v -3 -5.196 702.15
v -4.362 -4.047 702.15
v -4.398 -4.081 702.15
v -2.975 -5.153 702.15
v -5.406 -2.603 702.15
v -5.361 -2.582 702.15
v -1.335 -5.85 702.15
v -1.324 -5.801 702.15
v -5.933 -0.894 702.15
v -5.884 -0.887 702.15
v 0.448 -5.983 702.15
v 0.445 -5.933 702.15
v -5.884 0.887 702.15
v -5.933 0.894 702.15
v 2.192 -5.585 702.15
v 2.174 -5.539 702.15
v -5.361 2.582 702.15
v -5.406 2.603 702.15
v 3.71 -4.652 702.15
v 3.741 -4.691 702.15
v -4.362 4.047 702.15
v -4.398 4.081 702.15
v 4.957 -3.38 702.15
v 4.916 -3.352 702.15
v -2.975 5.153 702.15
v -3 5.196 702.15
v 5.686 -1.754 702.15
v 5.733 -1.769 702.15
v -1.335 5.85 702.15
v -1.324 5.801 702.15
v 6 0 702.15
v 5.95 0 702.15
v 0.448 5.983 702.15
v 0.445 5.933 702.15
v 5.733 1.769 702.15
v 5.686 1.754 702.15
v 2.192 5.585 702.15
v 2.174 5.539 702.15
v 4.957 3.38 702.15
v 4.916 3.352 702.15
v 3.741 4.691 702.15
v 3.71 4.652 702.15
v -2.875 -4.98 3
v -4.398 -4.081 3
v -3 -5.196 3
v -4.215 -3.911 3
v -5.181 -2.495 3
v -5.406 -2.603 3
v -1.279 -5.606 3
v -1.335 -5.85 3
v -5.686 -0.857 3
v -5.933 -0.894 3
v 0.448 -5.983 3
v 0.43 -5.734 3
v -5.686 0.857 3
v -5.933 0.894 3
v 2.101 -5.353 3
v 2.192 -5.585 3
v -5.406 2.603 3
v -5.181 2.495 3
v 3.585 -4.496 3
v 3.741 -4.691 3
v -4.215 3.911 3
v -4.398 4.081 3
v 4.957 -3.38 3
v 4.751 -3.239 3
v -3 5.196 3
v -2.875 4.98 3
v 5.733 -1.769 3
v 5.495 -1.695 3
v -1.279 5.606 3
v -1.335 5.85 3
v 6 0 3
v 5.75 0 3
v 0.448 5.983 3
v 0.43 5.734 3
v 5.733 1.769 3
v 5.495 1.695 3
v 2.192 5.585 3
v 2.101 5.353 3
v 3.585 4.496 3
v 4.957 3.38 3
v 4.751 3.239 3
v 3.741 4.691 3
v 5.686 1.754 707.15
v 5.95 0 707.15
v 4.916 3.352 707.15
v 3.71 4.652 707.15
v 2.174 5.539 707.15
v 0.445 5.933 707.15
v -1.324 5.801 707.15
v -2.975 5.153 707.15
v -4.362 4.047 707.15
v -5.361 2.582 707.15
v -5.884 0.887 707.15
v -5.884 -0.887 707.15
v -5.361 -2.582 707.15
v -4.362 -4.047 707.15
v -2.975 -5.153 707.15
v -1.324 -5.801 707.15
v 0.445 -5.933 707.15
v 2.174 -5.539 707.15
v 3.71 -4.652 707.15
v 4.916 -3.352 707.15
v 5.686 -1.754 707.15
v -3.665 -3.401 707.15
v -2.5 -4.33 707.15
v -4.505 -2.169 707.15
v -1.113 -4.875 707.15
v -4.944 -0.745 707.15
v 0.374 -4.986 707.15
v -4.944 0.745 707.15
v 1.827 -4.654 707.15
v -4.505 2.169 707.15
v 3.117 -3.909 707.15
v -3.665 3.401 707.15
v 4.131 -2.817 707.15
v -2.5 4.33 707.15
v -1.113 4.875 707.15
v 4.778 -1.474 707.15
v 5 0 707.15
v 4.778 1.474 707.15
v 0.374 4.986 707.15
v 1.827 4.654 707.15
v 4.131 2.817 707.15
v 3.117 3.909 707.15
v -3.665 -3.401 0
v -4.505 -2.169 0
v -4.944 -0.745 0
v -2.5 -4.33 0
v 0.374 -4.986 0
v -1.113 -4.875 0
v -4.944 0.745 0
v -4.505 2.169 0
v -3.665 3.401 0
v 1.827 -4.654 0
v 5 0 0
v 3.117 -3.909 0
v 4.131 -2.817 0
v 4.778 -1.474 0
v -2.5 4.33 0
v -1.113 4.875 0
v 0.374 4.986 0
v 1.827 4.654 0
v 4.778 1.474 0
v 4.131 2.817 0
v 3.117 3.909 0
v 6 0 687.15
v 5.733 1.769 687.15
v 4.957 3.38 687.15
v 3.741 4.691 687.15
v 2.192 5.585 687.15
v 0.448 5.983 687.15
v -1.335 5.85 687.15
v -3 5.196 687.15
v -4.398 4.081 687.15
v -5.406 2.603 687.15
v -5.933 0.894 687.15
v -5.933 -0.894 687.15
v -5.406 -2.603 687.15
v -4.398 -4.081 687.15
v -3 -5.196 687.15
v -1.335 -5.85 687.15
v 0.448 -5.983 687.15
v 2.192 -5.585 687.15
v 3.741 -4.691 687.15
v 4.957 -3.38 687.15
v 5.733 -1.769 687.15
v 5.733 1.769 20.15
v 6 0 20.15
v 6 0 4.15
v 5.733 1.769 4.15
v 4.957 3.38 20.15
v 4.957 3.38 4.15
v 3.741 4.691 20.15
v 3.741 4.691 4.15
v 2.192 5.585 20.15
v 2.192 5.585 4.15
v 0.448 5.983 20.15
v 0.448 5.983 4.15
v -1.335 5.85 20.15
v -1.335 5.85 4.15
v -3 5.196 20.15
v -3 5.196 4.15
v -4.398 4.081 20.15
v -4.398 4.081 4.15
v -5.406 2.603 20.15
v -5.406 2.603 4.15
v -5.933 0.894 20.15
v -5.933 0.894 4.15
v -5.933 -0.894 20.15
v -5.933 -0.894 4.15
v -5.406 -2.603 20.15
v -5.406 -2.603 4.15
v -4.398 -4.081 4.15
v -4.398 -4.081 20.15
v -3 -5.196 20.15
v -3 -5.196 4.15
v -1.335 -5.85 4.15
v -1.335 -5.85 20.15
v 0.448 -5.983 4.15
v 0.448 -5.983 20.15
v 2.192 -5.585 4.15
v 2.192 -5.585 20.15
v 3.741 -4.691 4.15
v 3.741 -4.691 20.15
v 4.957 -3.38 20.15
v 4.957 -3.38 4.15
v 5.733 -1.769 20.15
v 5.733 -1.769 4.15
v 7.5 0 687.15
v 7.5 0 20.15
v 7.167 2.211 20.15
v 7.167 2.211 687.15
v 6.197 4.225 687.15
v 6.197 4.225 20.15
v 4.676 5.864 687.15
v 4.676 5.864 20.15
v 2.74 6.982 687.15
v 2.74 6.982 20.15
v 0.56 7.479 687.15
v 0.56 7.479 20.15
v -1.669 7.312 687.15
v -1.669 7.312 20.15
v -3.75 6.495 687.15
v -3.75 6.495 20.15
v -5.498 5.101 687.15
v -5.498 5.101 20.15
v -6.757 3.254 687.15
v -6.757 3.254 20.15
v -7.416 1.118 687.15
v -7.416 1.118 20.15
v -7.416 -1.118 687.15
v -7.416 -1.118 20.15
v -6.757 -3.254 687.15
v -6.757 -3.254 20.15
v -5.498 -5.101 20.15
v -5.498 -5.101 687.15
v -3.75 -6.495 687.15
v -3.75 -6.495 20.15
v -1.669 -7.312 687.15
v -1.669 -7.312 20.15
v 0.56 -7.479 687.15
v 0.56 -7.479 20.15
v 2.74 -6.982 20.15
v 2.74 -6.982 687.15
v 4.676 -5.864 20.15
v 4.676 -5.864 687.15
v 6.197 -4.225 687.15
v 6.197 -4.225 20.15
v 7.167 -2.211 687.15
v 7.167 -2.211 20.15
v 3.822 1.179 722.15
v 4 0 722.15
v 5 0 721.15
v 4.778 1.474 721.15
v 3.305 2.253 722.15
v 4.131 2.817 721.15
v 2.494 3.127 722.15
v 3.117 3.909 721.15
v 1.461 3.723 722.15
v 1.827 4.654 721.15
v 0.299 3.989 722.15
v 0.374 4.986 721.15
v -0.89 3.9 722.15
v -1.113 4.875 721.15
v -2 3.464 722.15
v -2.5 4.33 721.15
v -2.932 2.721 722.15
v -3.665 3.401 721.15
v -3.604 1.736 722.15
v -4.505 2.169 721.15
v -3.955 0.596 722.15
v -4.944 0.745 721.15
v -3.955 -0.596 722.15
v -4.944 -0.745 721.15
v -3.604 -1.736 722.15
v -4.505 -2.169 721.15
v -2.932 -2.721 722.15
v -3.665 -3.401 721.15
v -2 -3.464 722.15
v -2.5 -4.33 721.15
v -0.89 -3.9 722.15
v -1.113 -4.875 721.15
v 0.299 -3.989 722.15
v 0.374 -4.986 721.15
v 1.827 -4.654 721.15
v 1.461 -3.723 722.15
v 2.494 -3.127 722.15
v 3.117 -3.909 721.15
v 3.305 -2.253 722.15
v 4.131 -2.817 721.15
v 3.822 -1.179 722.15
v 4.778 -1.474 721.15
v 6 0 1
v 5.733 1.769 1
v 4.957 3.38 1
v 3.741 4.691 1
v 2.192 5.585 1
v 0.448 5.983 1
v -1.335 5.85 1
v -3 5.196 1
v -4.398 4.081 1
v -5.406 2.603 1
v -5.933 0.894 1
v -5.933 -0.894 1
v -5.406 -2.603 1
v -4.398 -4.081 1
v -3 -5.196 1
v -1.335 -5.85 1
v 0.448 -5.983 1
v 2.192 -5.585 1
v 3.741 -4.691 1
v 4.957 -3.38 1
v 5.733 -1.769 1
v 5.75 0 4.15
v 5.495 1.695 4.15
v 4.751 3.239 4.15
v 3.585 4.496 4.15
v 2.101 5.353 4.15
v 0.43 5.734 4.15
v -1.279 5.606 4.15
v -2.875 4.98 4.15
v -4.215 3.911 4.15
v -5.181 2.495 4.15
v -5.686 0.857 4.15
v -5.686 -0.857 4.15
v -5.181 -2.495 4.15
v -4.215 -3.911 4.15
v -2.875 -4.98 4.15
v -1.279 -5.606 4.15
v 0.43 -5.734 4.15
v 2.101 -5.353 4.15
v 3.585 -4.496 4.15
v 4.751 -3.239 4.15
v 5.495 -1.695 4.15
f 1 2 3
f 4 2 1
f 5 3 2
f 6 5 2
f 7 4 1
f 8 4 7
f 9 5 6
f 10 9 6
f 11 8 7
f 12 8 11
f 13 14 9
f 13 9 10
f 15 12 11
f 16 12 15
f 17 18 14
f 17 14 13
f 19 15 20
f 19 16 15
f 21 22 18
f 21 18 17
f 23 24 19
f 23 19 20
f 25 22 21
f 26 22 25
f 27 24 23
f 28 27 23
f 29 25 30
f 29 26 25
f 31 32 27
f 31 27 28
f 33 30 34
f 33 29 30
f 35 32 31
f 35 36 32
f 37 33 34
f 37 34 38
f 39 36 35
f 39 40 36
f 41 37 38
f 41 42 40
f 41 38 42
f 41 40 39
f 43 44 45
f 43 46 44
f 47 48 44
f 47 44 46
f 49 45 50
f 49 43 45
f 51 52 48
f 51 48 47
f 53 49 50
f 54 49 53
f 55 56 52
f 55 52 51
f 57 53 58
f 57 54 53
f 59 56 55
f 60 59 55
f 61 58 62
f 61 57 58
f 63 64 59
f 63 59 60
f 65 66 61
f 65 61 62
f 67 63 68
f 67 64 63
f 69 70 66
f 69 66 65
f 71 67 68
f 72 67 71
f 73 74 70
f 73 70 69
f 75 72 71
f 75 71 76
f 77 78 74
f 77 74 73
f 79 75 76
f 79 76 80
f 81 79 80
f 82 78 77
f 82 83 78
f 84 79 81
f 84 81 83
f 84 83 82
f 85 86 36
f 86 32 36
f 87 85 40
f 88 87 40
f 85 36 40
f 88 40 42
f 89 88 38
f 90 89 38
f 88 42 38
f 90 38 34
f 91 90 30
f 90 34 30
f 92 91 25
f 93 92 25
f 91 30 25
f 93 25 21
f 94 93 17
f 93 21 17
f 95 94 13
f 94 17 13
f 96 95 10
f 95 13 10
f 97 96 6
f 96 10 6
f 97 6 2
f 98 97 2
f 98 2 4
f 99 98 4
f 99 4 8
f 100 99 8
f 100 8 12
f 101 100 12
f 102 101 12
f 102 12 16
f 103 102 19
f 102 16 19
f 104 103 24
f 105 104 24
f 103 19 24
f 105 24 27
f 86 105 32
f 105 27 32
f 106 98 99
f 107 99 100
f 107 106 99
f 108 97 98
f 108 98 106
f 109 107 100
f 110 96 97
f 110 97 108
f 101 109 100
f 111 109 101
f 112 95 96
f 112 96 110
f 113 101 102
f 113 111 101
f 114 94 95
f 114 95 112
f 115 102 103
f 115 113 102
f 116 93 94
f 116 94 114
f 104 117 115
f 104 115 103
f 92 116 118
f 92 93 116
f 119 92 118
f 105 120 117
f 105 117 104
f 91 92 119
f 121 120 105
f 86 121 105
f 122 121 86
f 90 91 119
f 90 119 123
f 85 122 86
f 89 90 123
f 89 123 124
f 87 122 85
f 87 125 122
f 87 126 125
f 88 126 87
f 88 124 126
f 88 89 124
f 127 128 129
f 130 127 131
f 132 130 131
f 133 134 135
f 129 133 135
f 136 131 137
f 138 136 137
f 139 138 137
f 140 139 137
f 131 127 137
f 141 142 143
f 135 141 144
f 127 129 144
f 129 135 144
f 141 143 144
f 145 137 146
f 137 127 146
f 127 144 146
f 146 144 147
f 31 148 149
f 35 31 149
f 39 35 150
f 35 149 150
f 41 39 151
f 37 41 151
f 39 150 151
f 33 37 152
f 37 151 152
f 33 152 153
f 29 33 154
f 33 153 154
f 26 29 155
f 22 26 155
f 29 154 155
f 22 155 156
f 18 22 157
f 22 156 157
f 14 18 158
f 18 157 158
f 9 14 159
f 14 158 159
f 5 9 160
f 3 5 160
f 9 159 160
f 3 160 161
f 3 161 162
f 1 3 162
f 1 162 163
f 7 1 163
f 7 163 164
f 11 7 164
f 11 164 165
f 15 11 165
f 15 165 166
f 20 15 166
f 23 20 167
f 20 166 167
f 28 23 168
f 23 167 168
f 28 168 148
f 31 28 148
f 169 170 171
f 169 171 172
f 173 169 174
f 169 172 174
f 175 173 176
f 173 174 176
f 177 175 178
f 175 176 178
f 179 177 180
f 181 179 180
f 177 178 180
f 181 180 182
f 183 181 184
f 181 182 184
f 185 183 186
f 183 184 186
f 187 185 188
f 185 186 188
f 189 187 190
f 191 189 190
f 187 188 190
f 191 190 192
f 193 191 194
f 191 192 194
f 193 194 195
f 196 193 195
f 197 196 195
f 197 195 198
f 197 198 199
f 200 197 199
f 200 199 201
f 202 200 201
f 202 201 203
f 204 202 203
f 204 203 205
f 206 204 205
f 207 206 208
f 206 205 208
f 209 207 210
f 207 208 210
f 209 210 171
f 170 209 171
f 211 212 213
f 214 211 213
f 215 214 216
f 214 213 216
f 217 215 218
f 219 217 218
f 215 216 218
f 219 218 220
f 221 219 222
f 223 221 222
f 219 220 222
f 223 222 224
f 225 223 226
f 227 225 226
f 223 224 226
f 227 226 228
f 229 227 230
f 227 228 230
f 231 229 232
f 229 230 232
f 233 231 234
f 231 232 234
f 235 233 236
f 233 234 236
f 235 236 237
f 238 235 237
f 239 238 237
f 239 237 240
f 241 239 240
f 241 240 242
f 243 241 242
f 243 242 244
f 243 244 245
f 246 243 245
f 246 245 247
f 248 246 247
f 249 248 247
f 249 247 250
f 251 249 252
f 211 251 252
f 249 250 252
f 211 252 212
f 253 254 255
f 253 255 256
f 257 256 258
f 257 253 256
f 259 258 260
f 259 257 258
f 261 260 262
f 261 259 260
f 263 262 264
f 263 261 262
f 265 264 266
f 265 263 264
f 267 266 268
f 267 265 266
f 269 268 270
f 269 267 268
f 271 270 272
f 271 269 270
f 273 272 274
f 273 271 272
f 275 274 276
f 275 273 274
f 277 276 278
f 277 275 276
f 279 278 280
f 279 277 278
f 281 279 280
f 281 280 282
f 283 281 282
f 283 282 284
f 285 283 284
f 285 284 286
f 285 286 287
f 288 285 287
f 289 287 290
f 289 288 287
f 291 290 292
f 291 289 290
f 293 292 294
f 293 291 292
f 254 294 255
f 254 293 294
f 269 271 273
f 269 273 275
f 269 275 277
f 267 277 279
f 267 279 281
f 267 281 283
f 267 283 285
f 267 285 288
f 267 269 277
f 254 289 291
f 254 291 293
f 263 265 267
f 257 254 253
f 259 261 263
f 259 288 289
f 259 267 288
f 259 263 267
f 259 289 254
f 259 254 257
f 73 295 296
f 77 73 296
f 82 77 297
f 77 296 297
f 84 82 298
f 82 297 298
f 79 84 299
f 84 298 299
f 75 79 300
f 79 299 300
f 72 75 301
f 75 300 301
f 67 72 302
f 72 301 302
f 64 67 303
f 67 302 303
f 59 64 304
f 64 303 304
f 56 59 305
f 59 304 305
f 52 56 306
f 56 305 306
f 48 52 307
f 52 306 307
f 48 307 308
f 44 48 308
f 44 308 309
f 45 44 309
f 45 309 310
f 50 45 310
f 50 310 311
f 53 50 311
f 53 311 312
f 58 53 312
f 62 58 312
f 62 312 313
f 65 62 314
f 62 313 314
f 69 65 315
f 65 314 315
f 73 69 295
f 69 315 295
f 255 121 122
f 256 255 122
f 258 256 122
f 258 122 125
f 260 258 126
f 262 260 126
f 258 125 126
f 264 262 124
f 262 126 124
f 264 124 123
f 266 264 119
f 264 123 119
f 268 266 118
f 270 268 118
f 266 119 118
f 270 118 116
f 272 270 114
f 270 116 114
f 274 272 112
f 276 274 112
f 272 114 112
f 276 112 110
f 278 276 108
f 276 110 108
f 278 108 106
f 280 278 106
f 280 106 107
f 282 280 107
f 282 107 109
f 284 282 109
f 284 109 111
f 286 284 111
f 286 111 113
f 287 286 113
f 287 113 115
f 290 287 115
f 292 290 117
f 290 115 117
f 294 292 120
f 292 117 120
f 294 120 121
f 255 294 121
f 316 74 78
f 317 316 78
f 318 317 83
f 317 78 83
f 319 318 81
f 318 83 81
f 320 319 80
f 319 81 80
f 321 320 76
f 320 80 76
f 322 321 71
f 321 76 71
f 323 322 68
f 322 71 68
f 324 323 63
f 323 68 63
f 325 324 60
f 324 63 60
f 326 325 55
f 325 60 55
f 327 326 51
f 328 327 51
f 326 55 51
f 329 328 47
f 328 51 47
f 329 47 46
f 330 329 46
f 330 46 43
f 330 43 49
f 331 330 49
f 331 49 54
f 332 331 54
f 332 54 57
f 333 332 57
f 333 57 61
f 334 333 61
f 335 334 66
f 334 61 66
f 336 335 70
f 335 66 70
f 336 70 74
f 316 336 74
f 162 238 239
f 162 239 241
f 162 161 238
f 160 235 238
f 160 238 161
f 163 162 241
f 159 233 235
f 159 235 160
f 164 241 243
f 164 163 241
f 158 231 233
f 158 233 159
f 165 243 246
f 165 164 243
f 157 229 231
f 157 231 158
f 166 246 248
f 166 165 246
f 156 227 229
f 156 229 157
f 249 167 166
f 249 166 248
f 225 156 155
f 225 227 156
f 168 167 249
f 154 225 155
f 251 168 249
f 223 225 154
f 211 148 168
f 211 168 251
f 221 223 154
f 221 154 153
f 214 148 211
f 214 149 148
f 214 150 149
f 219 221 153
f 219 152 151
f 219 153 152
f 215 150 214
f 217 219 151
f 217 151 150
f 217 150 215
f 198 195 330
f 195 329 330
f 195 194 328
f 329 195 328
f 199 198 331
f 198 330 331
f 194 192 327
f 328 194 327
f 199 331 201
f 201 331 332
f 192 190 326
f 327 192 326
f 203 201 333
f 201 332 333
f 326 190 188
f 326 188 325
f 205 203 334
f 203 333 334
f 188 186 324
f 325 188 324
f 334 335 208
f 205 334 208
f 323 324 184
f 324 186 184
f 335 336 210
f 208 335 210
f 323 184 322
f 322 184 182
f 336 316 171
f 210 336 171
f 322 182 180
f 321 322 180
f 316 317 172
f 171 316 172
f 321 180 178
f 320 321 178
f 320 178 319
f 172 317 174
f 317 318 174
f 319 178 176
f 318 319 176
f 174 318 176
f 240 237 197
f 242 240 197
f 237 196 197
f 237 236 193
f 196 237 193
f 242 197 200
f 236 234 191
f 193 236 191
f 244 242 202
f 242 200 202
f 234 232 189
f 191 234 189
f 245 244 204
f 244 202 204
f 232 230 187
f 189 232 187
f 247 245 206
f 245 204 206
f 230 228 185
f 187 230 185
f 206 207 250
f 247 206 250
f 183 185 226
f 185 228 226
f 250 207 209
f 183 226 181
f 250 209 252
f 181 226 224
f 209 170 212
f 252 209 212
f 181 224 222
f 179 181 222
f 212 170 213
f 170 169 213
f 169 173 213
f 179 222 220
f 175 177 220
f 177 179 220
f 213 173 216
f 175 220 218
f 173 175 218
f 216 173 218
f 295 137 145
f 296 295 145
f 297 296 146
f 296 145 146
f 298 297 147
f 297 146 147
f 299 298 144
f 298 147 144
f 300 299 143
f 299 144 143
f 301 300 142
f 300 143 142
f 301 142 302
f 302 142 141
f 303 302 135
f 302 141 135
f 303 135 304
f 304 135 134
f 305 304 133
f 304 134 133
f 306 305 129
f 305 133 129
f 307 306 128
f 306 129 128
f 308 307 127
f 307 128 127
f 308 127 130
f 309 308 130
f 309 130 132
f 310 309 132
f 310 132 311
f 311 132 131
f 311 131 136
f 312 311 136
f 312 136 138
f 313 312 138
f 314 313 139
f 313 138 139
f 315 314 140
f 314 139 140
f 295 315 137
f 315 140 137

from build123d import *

# Parameters (mm, degrees)
F0_R      = 6
F1_DEPTH  = 3
F2_R      = 5.75
F3_DEPTH  = 1.15
F4_R      = 6
F4_R_2    = 5.75
F5_DEPTH  = 16
F6_R      = 7.5
F6_R_2    = 6
F7_DEPTH  = 667
F8_R      = 6
F9_DEPTH  = 15
F10_R     = 5.95
F11_DEPTH = 2
F12_R     = 5.95
F13_DEPTH = 3
F14_R     = 5
F15_DEPTH = 15
F16_SIZE  = 1


with BuildPart() as f1:
    # F0 (on Top) → F1 (new body)
    with BuildSketch(Plane.XY):
        Circle(F0_R)
    extrude(amount=F1_DEPTH)

    # F2 (on face) → F3 (join)
    with BuildSketch(Plane.XY.offset(3)):
        Circle(F2_R)
    extrude(amount=F3_DEPTH)

    # F4 (on face) → F5 (join)
    with BuildSketch(Plane.XY.offset(4.15)):
        Circle(F4_R)
        Circle(F4_R_2, mode=Mode.SUBTRACT)
        Circle(F4_R_2)
    extrude(amount=F5_DEPTH)

    # F6 (on face) → F7 (join)
    with BuildSketch(Plane.XY.offset(20.15)):
        Circle(F6_R)
        Circle(F6_R_2, mode=Mode.SUBTRACT)
        Circle(F6_R_2)
    extrude(amount=F7_DEPTH)

    # F8 (on face) → F9 (join)
    with BuildSketch(Plane.XY.offset(687.15)):
        Circle(F8_R)
    extrude(amount=F9_DEPTH)

    # F10 (on face) → F11 (join)
    with BuildSketch(Plane.XY.offset(702.15)):
        Circle(F10_R)
    extrude(amount=F11_DEPTH)

    # F12 (on face) → F13 (join)
    with BuildSketch(Plane.XY.offset(704.15)):
        Circle(F12_R)
    extrude(amount=F13_DEPTH)

    # F14 (on face) → F15 (join)
    with BuildSketch(Plane.XY.offset(707.15)):
        Circle(F14_R)
    extrude(amount=F15_DEPTH)

    # F16
    f16_edges = [f1.edges().sort_by_distance(p)[0] for p in [
        (-5, 0, 722.15),
        (-6, 0, 0),
    ]]
    chamfer(f16_edges, length=F16_SIZE)


solid = f1.part
